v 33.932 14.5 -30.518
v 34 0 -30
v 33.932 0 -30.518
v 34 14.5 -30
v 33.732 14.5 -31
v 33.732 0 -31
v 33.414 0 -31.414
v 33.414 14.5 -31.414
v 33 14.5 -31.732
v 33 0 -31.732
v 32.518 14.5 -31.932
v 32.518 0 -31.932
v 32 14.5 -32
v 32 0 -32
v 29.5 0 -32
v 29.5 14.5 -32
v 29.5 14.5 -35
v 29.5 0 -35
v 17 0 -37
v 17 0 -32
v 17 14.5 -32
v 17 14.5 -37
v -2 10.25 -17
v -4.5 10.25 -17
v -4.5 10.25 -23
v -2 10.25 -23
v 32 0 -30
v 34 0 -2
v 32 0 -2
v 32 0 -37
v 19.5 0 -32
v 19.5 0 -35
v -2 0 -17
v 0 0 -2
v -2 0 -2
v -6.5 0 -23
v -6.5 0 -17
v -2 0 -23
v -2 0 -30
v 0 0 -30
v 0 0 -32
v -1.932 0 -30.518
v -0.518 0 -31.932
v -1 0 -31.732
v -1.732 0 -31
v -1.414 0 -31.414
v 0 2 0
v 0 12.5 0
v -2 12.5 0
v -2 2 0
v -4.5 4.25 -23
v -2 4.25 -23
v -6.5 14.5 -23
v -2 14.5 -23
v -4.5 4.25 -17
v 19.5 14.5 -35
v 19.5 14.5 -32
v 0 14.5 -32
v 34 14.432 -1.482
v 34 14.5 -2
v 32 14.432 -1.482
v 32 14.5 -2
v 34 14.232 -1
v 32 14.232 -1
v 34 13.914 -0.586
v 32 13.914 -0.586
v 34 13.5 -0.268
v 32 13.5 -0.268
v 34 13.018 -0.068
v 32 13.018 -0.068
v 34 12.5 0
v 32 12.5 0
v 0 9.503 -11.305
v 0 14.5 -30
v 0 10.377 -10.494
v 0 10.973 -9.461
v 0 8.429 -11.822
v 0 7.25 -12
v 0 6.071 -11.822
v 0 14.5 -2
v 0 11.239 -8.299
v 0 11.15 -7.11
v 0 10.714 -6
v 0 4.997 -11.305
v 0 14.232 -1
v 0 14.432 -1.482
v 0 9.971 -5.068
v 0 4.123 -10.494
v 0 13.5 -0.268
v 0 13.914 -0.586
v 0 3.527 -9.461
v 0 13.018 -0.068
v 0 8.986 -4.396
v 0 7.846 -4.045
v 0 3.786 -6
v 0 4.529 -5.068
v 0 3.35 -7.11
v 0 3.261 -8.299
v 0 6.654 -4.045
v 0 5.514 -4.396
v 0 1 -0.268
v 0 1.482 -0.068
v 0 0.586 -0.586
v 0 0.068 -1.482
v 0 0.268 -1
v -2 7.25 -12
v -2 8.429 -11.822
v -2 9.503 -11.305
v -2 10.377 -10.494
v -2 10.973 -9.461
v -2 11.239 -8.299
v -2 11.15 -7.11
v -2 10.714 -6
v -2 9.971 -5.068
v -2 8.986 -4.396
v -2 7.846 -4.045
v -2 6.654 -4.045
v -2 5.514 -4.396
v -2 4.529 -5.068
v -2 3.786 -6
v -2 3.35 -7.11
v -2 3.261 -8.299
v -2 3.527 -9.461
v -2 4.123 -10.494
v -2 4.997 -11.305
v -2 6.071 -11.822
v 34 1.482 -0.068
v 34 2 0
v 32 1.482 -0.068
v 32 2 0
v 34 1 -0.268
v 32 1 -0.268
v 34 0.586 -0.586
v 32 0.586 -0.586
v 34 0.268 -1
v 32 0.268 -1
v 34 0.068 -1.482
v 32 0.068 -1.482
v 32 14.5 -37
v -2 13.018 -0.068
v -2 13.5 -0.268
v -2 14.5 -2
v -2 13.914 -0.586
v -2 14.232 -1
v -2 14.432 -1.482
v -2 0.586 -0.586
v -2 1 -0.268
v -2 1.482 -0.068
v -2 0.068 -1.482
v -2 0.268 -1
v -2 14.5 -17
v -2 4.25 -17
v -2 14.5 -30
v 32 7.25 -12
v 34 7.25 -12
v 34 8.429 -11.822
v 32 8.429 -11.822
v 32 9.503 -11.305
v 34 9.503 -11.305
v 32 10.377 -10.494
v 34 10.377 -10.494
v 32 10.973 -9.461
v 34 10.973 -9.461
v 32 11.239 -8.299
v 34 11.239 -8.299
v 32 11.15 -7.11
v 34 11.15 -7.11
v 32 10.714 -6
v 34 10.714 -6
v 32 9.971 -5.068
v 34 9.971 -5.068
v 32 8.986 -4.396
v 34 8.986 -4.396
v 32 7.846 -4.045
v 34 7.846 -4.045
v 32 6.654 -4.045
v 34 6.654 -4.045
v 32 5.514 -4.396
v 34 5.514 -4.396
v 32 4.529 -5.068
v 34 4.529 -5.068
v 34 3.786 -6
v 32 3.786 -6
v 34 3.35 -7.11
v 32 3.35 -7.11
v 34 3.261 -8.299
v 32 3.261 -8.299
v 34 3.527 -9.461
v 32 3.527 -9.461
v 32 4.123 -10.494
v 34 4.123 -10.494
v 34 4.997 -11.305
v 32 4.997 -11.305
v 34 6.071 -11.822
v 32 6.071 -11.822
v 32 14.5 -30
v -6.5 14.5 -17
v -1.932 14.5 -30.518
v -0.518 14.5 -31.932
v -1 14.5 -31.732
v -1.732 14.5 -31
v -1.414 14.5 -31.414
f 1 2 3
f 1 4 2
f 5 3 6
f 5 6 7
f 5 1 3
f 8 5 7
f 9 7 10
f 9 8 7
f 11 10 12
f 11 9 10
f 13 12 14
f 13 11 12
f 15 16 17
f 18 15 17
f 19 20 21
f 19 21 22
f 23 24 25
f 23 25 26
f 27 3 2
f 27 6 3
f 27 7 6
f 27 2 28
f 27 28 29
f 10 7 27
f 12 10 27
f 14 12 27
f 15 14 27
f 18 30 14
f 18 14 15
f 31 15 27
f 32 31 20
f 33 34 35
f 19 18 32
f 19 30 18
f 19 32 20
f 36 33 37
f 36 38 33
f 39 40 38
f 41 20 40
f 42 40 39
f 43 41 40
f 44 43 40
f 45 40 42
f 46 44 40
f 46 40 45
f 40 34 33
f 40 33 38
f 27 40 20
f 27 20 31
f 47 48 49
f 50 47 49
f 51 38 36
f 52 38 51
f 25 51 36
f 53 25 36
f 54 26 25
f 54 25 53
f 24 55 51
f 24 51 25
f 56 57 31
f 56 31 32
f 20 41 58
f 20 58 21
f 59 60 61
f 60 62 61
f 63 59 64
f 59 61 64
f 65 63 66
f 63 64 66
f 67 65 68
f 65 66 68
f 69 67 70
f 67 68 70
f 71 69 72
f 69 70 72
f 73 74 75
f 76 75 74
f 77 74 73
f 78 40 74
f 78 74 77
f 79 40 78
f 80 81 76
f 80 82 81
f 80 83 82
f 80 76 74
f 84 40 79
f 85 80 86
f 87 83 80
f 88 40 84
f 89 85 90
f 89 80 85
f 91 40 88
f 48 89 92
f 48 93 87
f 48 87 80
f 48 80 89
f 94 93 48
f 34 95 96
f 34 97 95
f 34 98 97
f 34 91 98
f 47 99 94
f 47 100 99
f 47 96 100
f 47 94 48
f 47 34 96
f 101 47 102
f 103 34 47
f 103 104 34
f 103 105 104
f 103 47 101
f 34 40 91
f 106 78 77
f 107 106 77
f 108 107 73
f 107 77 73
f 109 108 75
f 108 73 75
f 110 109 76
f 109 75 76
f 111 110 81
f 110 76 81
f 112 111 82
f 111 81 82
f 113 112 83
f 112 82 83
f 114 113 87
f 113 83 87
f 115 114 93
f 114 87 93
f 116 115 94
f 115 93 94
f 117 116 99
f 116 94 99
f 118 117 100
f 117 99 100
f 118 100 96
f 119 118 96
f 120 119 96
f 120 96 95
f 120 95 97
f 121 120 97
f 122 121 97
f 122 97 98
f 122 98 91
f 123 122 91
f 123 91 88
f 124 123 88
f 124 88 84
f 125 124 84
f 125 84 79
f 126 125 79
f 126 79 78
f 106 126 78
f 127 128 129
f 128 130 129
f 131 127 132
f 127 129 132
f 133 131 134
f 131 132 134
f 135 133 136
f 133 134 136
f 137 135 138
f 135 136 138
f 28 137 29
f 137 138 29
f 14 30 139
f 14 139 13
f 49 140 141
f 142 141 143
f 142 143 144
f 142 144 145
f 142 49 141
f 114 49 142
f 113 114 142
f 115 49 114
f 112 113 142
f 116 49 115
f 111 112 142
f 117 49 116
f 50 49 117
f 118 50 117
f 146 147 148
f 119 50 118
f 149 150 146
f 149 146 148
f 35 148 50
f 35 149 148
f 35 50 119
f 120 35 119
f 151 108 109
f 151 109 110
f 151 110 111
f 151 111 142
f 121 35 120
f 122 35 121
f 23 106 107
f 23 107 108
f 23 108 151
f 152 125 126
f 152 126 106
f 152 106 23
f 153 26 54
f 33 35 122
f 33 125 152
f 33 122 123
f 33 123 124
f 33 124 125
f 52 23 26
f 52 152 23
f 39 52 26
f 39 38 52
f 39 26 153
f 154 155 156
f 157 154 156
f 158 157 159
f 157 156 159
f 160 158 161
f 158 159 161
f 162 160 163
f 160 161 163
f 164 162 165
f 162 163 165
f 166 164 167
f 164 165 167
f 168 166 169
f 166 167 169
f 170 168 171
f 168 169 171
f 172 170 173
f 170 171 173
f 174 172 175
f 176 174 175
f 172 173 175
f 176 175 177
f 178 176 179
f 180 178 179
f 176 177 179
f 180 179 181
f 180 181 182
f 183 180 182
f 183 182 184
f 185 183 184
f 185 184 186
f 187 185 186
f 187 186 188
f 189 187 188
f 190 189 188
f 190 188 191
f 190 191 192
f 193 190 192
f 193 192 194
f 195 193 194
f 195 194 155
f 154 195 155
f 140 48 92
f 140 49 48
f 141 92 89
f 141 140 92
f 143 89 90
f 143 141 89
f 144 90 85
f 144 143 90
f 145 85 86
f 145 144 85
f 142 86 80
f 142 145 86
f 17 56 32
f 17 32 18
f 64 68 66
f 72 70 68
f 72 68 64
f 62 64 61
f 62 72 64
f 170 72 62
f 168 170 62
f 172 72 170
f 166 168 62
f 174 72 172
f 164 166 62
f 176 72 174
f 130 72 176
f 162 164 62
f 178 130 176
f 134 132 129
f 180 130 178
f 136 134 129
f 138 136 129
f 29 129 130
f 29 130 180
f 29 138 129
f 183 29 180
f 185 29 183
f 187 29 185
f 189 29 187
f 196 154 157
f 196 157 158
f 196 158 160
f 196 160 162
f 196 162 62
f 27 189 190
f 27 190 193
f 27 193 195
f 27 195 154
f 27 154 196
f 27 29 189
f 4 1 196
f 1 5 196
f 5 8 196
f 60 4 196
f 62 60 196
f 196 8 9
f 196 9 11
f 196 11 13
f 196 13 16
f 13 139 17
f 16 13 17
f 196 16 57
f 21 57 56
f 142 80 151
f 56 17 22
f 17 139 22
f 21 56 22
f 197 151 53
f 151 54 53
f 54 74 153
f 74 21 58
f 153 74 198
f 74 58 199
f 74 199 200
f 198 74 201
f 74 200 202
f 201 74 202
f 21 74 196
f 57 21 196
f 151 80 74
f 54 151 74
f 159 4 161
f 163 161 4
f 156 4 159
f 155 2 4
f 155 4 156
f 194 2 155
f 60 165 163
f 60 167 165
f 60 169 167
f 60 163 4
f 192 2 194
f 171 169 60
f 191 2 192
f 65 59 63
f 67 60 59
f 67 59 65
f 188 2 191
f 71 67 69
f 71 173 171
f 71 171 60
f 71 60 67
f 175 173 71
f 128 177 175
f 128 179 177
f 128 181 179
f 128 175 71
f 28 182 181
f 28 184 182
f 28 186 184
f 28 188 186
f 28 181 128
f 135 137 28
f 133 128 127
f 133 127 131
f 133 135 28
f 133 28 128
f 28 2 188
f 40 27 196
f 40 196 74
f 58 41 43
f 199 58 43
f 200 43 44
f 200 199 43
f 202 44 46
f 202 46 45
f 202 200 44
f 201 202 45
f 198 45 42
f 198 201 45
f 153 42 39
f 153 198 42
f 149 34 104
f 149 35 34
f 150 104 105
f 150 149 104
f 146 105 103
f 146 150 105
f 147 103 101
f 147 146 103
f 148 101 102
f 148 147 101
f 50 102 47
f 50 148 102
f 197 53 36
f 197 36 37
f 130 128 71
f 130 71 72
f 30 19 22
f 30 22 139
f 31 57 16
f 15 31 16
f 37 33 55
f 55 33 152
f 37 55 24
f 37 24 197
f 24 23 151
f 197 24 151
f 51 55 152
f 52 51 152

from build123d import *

# Parameters (mm, degrees)
EXTRUDE_1_DEPTH     = 14.5
SKETCH_2_W          = 10
SKETCH_2_H          = 3
CUT_EXTRUDE_1_DEPTH = 53.299617589
SKETCH_3_R          = 4
CUT_EXTRUDE_3_DEPTH = 40
FILLET_1_R          = 2
FILLET_2_R          = 2
FILLET_3_R          = 2
FILLET_4_R          = 2
FILLET_5_R          = 2
FILLET_6_R          = 2
SKETCH_5_W          = 6
SKETCH_5_H          = 14.5
EXTRUDE_2_DEPTH     = 4.5
SKETCH_6_W          = 2.5
SKETCH_6_H          = 6
CUT_EXTRUDE_4_DEPTH = 43.026777178


with BuildPart() as part:
    # Эскиз1 → Бобышка-Вытянуть1 (new body)
    with BuildSketch(Plane(origin=(0, 0, 0), x_dir=(1, 0, 0), z_dir=(0, 1, 0))):
        Polygon((0, 0), (-2, 0), (-2, 32), (17, 32), (17, 37), (32, 37), (32, 32), (34, 32), (34, 0), (32, 0), (32, 30), (0, 30), align=None)
    extrude(amount=EXTRUDE_1_DEPTH)

    # Эскиз2 → Вырез-Вытянуть1 (cut, through all)
    with BuildSketch(Plane(origin=(0, 14.5, 0), x_dir=(1, 0, 0), z_dir=(0, 1, 0))):
        with Locations((24.5, 33.5)):
            Rectangle(SKETCH_2_W, SKETCH_2_H)
    extrude(amount=-CUT_EXTRUDE_1_DEPTH, mode=Mode.SUBTRACT)

    # Эскиз3 → Вырез-Вытянуть3 (cut)
    with BuildSketch(Plane(origin=(34, 0, 0), x_dir=(0, 0, -1), z_dir=(1, 0, 0))):
        with Locations((8, 7.25)):
            Circle(SKETCH_3_R)
    extrude(amount=-CUT_EXTRUDE_3_DEPTH, mode=Mode.SUBTRACT)

    # Скругление1
    fillet_1_edges = [part.edges().sort_by_distance(p)[0] for p in [
        (34, 7.25, -32),
    ]]
    fillet(fillet_1_edges, radius=FILLET_1_R - 0.0001)  # a hair under: the kernel refuses the full size

    # Скругление2
    fillet_2_edges = [part.edges().sort_by_distance(p)[0] for p in [
        (-2, 7.25, -32),
    ]]
    fillet(fillet_2_edges, radius=FILLET_2_R)

    # Скругление3
    fillet_3_edges = [part.edges().sort_by_distance(p)[0] for p in [
        (-1, 14.5, 0),
    ]]
    fillet(fillet_3_edges, radius=FILLET_3_R)

    # Скругление4
    fillet_4_edges = [part.edges().sort_by_distance(p)[0] for p in [
        (33, 14.5, 0),
    ]]
    fillet(fillet_4_edges, radius=FILLET_4_R)

    # Скругление5
    fillet_5_edges = [part.edges().sort_by_distance(p)[0] for p in [
        (33, 0, 0),
    ]]
    fillet(fillet_5_edges, radius=FILLET_5_R)

    # Скругление6
    fillet_6_edges = [part.edges().sort_by_distance(p)[0] for p in [
        (-1, 0, 0),
    ]]
    fillet(fillet_6_edges, radius=FILLET_6_R)

    # Эскиз5 → Бобышка-Вытянуть2 (add)
    with BuildSketch(Plane.ZY.offset(2)):
        with Locations((-20, 7.25)):
            Rectangle(SKETCH_5_W, SKETCH_5_H)
    extrude(amount=EXTRUDE_2_DEPTH)

    # Эскиз6 → Вырез-Вытянуть4 (cut, through all)
    with BuildSketch(Plane.XY.offset(-17)):
        with Locations((-3.25, 7.25)):
            Rectangle(SKETCH_6_W, SKETCH_6_H)
    extrude(amount=-CUT_EXTRUDE_4_DEPTH, mode=Mode.SUBTRACT)


solid = part.part
